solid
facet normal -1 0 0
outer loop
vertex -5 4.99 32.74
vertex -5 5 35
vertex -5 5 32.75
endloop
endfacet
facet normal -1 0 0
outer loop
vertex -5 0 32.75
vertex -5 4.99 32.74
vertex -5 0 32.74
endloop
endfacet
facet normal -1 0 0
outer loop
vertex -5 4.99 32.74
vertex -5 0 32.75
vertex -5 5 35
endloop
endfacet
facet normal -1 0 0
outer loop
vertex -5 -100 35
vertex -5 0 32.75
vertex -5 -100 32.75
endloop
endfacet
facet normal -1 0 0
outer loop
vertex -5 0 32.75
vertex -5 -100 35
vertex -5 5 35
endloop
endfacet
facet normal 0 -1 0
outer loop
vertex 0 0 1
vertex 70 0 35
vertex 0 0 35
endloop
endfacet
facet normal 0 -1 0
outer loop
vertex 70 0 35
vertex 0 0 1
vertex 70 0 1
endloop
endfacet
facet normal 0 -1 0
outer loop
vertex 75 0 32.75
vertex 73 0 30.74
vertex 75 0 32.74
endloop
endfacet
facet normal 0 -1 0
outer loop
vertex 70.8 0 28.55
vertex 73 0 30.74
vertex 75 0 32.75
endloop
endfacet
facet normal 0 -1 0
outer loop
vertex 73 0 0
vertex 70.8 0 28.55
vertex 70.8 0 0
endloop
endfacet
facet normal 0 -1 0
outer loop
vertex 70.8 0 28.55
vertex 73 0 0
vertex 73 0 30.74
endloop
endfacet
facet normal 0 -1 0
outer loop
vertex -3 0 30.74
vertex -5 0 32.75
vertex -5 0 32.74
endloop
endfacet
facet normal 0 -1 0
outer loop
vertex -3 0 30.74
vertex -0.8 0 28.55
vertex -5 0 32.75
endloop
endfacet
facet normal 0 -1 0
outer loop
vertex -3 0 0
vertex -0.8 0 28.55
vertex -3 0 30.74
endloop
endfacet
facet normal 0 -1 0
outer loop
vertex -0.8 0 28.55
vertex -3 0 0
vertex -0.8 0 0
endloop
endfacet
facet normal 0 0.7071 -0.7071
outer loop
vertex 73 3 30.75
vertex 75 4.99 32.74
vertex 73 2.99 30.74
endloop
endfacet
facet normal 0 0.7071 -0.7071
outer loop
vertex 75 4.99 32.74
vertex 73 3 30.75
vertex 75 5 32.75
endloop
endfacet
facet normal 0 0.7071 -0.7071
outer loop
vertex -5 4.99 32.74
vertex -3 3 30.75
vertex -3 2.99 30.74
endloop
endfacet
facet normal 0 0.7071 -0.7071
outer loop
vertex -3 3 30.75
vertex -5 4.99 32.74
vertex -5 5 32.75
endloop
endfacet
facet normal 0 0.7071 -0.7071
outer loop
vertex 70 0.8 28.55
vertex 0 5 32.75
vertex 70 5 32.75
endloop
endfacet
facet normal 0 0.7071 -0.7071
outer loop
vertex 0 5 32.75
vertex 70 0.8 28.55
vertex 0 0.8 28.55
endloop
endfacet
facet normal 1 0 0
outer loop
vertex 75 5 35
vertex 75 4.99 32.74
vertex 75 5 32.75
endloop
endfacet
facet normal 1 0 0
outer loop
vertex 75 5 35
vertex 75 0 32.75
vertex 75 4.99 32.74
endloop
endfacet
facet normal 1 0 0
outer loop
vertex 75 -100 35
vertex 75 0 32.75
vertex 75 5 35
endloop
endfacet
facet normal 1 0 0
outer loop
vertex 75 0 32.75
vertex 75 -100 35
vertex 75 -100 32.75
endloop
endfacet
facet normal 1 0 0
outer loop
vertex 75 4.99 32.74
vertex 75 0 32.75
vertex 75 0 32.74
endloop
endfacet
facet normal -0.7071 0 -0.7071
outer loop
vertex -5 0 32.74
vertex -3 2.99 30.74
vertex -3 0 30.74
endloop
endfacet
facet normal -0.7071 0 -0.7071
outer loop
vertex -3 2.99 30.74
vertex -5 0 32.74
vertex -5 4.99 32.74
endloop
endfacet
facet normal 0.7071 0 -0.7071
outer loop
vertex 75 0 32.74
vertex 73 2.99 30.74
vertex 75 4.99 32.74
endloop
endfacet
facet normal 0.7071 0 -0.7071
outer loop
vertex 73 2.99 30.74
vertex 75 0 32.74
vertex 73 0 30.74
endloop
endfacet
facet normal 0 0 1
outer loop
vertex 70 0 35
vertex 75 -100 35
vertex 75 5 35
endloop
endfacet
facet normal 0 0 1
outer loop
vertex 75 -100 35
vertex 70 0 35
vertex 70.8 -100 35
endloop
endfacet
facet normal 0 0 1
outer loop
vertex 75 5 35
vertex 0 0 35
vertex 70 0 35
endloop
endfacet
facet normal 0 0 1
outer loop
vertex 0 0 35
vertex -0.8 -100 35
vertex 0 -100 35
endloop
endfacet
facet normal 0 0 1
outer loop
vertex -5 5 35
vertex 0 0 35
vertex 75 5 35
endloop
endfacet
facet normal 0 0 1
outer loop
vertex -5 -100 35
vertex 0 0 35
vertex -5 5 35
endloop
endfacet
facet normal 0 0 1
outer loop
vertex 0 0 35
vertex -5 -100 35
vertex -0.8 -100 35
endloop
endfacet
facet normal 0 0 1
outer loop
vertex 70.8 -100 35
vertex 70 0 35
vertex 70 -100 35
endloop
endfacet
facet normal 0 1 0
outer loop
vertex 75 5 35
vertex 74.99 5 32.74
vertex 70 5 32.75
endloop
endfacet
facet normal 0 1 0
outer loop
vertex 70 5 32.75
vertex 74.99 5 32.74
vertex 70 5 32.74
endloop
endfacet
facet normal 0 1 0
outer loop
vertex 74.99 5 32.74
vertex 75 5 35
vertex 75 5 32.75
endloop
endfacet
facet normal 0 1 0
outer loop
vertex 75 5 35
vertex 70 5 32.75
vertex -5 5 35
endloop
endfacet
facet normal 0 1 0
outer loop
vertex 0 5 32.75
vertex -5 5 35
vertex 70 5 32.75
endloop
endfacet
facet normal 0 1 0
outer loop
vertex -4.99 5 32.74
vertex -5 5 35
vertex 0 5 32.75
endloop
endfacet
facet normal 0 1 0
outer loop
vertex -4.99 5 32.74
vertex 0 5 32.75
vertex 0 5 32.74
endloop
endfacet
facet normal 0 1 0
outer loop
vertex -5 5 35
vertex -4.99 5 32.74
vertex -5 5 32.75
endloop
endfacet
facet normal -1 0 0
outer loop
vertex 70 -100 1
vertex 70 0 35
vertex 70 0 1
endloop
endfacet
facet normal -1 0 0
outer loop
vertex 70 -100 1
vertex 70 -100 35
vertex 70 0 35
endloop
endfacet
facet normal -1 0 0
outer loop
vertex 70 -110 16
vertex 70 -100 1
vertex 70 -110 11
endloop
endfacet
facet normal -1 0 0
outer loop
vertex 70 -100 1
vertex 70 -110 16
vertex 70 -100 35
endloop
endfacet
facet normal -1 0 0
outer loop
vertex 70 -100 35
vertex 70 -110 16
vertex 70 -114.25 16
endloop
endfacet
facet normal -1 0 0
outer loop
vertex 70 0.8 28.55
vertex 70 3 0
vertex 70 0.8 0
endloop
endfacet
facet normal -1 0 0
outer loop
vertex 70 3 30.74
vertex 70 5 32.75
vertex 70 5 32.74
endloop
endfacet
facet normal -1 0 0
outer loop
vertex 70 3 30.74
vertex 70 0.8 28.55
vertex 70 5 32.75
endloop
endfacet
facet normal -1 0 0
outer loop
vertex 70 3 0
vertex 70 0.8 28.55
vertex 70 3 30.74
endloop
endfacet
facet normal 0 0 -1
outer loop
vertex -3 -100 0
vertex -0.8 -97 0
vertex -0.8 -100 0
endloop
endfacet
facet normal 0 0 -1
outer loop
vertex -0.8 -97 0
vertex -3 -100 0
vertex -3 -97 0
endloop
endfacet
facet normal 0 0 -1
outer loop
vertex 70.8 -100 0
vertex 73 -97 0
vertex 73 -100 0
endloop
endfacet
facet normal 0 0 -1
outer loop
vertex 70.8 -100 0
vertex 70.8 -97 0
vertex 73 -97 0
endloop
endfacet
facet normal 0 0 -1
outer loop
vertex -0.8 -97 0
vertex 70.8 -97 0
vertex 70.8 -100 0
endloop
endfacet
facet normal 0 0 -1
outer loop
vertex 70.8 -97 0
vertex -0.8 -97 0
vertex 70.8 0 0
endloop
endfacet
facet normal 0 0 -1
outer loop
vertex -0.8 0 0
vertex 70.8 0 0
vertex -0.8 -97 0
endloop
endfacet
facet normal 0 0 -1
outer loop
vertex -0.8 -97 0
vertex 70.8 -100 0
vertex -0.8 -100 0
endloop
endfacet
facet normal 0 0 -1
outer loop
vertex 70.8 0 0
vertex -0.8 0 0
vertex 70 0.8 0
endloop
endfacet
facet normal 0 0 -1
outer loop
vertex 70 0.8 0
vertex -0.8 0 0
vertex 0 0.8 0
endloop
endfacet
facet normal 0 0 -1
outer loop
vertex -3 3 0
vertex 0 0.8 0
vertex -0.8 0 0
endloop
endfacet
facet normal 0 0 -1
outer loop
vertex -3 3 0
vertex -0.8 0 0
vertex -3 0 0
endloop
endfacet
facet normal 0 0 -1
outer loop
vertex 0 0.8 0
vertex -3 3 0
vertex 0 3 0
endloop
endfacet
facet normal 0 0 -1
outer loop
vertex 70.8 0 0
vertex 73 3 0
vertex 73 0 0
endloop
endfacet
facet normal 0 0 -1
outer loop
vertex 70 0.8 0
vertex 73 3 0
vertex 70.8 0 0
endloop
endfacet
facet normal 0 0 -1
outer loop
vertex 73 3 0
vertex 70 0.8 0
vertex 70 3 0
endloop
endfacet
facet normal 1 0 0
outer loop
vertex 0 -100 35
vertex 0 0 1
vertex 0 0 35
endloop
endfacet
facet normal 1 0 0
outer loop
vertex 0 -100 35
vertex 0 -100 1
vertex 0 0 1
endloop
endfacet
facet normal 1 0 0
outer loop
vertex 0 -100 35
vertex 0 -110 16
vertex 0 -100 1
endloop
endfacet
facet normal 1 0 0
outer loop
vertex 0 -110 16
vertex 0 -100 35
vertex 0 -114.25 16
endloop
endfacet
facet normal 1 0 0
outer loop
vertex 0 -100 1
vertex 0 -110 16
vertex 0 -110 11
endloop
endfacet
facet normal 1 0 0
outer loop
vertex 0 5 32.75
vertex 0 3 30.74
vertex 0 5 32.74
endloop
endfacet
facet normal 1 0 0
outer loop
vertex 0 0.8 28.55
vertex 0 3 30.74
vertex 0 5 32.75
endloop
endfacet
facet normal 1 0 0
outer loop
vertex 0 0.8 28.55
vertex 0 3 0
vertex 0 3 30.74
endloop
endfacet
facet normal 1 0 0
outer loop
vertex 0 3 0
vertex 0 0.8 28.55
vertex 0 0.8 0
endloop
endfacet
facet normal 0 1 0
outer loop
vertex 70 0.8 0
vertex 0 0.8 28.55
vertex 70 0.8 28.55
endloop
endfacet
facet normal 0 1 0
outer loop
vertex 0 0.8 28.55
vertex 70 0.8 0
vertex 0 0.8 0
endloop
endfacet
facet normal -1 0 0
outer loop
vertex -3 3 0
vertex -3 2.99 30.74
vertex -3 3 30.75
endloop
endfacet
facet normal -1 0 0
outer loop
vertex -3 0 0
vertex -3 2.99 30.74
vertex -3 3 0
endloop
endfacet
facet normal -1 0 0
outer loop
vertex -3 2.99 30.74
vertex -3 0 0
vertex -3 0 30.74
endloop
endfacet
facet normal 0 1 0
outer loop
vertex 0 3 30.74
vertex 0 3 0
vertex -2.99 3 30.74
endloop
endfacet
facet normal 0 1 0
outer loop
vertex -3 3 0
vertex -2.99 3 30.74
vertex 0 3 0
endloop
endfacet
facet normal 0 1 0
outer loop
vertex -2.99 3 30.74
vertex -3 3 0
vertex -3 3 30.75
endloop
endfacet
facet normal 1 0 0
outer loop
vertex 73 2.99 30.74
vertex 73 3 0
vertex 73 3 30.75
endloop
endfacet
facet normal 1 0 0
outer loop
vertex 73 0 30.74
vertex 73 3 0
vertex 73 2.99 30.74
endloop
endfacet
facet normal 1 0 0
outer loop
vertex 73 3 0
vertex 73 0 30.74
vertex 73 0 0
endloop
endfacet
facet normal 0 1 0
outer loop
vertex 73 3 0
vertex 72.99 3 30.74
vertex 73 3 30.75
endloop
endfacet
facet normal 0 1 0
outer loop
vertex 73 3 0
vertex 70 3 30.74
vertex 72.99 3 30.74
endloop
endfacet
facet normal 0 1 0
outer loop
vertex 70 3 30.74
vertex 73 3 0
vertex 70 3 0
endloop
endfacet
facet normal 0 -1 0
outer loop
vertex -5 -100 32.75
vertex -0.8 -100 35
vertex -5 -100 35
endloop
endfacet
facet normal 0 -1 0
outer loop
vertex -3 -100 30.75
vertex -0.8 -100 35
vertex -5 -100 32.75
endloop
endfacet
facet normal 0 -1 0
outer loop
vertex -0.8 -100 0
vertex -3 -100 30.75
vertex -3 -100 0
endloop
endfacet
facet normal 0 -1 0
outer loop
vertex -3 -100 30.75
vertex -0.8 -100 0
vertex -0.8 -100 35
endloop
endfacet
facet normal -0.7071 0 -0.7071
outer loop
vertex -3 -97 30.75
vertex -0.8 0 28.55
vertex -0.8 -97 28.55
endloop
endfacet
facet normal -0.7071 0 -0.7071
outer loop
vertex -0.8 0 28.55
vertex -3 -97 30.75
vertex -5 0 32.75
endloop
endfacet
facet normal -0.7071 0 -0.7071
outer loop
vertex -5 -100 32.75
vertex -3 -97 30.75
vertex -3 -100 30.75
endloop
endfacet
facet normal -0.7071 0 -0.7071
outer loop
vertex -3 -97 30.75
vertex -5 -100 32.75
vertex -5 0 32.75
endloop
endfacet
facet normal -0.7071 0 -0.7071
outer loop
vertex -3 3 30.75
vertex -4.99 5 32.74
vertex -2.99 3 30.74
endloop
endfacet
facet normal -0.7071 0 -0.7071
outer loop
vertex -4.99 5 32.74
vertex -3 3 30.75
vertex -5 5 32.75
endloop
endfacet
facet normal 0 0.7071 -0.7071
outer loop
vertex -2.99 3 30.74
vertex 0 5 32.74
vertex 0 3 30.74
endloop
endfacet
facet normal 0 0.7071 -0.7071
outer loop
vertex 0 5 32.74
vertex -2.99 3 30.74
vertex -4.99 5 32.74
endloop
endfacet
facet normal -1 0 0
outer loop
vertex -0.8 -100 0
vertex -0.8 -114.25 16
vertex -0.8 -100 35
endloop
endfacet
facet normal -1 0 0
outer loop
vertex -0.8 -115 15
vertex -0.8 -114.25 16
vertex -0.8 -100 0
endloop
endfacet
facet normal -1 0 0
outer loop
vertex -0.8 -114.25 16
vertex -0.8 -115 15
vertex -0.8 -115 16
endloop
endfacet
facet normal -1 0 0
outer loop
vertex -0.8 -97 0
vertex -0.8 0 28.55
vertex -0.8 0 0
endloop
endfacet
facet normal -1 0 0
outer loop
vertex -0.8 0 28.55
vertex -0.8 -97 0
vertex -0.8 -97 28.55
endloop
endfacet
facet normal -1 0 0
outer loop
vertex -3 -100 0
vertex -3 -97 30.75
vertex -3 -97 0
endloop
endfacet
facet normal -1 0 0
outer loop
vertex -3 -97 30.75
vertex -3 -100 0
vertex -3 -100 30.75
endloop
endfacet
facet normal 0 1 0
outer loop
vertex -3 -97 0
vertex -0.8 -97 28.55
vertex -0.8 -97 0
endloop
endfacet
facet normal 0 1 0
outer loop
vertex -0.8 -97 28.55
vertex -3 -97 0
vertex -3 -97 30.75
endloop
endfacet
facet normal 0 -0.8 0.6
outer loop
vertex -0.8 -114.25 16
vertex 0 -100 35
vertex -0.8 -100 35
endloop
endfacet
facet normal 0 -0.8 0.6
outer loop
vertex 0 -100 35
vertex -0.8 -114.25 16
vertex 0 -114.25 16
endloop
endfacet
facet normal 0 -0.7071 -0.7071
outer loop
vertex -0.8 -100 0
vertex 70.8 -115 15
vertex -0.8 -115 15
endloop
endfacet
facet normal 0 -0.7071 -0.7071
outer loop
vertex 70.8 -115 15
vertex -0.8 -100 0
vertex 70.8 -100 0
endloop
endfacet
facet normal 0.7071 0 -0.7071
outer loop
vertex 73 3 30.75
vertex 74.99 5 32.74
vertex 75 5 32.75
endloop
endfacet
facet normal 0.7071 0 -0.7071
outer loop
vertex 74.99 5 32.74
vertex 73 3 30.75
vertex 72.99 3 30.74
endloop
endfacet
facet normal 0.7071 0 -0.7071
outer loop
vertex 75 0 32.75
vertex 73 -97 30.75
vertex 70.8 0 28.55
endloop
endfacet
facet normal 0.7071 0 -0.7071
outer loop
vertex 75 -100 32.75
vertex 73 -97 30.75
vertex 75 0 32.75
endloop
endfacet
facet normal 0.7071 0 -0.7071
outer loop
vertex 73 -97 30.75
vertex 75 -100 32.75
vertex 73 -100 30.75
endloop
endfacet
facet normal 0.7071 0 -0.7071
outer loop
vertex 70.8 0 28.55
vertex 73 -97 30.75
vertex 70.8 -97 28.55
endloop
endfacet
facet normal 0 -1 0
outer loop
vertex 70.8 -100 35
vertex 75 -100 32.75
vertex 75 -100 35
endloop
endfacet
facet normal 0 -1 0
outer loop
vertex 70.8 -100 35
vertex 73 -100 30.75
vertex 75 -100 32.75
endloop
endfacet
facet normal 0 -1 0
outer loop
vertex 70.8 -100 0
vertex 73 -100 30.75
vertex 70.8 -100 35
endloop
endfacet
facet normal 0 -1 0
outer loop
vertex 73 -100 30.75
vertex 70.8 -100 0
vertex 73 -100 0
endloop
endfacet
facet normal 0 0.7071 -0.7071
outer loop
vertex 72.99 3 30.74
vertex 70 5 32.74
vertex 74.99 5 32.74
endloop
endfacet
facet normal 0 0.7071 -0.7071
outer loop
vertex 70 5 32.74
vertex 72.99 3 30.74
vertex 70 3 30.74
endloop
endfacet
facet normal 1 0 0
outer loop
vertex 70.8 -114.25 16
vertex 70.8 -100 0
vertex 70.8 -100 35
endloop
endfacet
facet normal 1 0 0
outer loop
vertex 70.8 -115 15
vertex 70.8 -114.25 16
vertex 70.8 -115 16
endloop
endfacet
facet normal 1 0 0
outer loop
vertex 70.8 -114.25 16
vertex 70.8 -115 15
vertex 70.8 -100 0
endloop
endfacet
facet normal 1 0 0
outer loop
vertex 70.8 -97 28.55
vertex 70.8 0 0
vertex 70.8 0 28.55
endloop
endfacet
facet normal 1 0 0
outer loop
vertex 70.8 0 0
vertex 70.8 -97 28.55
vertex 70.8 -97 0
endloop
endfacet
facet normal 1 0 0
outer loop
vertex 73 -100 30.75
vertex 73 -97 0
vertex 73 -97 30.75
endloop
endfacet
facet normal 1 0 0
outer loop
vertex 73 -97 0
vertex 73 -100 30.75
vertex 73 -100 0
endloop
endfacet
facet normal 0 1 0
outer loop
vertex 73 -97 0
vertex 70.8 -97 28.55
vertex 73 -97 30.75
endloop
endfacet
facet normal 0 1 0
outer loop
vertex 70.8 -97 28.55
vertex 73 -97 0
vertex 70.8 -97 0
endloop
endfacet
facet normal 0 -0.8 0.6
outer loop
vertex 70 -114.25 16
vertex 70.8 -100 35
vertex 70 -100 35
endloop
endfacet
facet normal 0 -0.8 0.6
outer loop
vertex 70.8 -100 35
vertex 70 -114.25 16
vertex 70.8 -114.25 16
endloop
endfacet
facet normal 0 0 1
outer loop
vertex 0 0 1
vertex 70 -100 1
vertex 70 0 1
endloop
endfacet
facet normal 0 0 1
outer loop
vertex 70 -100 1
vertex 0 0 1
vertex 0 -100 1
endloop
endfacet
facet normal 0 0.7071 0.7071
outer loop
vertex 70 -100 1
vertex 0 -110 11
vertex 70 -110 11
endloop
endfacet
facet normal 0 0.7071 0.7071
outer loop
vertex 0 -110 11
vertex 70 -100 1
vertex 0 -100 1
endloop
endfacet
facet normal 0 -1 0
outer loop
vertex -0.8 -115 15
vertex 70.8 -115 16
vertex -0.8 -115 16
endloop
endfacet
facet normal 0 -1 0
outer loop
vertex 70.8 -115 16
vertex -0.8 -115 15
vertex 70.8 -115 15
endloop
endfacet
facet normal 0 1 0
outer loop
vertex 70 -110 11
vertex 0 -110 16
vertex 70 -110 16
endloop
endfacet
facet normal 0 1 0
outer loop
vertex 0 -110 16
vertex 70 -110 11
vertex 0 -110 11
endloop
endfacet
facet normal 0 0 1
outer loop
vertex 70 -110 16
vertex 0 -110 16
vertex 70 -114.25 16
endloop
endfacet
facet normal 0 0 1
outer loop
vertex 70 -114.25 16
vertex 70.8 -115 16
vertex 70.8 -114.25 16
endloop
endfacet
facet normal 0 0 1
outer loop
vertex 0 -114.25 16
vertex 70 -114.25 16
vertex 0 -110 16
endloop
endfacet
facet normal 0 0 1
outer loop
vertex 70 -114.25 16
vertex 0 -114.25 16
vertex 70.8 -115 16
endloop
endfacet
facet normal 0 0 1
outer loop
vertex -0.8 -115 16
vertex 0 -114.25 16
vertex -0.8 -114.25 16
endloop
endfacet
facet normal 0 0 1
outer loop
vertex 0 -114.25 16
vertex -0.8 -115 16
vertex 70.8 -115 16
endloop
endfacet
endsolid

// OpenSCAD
tWidth = 70;                // Total width of box.
tLength = 100;              // Length of box plus front.
lipHeight = 15;             // Height of lip at front, no taller than tHeight.
tHeight = 35;               // Total height of box.
wallThickness = 0.8;        // Thickness of walls, 0.8mm (two shells) recommended.
columnThickness = 3;        // Thicker support columns helps when walls are thin, no smaller than wallThickness.
lipThickness = 5;           // Depth of lip arond the brim of the box, helps when walls are thin, best to keep above columnThickness.
baseThickness = 1;        // Thickness of the base of the bin.

module back (width, height, cThick, wThick, lThick){
    cube([width,wThick,height]);
    translate([cThick*-1,0,0])
        cube([cThick,cThick,height]);
    translate([width,0,0])
        cube([cThick,cThick,height]);
    union() {
        difference() {
            translate([lThick*-1,0,height-(cThick*3/4)])
                rotate([270,90,270])
                    linear_extrude(height = width + (lThick*2))
                        polygon(points=[[0,0],[lThick,0],[0,lThick]]);
            cCut(tHeight, lipThickness, columnThickness, 0, (lThick+0.01)*-1, -0.1);
            cCut(tHeight, lipThickness, columnThickness, 180, width+lThick+0.01, lThick);
        }
        translate([lThick*-1,0,height-(cThick*3/4)])
            cube([width + (lThick*2),lThick,(cThick*3/4)]);
    }
}

module left (length, height, lHeight, cThick, wThick, lThick){
    translate([wThick*-1,length*-1,0])
        cube([wThick,length,height]);
    translate([cThick*-1,length*-1,0])
        cube([cThick,cThick,height]);
    union() {
        difference() {
            translate([0,(length*-1),height-(cThick*3/4)])
                rotate([270,90,0])
                    linear_extrude(height = length + lThick)
                        polygon(points=[[0,0],[lThick,0],[0,lThick]]);
            cCut(tHeight, lipThickness, columnThickness, 270, (lThick+0.2)*-1, (lThick+0.01));
        }
        translate([lThick*-1,(length*-1),height-(cThick*3/4)])
            cube([lThick,length + lThick,(cThick*3/4)]);
    }
    rotate([0,270,0])
        linear_extrude(height = wThick)
            polygon(points=[[0,length*-1],[height,length*-1],[lHeight,(length + lHeight)*-1]]);
}

module right (length, height, width, lHeight, cThick, wThick, lThick){
    translate([width,length*-1,0])
        cube([wThick,length,height]);
    translate([width,length*-1,0])
        cube([cThick,cThick,height]);
    union() {
        difference() {
            translate([width,lThick,height-(cThick*3/4)])
                rotate([270,90,180])
                    linear_extrude(height = length + lThick)
                        polygon(points=[[0,0],[lThick,0],[0,lThick]]);
            cCut(tHeight, lipThickness, columnThickness, 270, width-0.01, (lThick+0.01));
        }
        translate([width,(length)*-1,height-(cThick*3/4)])
            cube([lThick,length + lThick,(cThick*3/4)]);
    }
    translate([width+wThick,0,0])
        rotate([0,270,0])
            linear_extrude(height = wThick)
                polygon(points=[[0,length*-1],[height,length*-1],[lHeight,(length + lHeight)*-1]]);
}

module bottom (length, height, width, lHeight, lThick, bThick, wThick){
    translate([0,length*-1,0])
        cube([width, length, bThick]);
    translate([width,0,0])
        rotate([0,270,0])
            linear_extrude(height = width)
                polygon(points=[[0,length*-1],[bThick,length*-1],[lHeight+bThick,(lHeight+length)*-1],[lHeight,(lHeight+length)*-1]]);
    translate([width+wThick,0,0])
        rotate([0,270,0])
            linear_extrude(height = width+(wThick*2))
                polygon(points=[[lHeight,(lHeight+length)*-1],[lHeight+bThick,(lHeight+length)*-1],[lHeight+bThick,((lHeight+length)*-1)+lThick],   [lHeight-lThick,(lHeight+length-lThick)*-1]]);
}

module cCut (height, lThick, cThick, zRot, xTrans, yTrans){
    translate([xTrans,yTrans,height-(lThick+cThick*3/4)])
            rotate([270,270,zRot])
                linear_extrude(height = lThick+1)
                    polygon(points=[[0,0],[lThick,0],[0,lThick]]);
}

back(tWidth, tHeight, columnThickness, wallThickness, lipThickness);
left(tLength, tHeight, lipHeight, columnThickness, wallThickness, lipThickness);
right(tLength, tHeight, tWidth, lipHeight, columnThickness, wallThickness, lipThickness);
bottom(tLength, tHeight, tWidth, lipHeight, lipThickness, baseThickness, wallThickness);
